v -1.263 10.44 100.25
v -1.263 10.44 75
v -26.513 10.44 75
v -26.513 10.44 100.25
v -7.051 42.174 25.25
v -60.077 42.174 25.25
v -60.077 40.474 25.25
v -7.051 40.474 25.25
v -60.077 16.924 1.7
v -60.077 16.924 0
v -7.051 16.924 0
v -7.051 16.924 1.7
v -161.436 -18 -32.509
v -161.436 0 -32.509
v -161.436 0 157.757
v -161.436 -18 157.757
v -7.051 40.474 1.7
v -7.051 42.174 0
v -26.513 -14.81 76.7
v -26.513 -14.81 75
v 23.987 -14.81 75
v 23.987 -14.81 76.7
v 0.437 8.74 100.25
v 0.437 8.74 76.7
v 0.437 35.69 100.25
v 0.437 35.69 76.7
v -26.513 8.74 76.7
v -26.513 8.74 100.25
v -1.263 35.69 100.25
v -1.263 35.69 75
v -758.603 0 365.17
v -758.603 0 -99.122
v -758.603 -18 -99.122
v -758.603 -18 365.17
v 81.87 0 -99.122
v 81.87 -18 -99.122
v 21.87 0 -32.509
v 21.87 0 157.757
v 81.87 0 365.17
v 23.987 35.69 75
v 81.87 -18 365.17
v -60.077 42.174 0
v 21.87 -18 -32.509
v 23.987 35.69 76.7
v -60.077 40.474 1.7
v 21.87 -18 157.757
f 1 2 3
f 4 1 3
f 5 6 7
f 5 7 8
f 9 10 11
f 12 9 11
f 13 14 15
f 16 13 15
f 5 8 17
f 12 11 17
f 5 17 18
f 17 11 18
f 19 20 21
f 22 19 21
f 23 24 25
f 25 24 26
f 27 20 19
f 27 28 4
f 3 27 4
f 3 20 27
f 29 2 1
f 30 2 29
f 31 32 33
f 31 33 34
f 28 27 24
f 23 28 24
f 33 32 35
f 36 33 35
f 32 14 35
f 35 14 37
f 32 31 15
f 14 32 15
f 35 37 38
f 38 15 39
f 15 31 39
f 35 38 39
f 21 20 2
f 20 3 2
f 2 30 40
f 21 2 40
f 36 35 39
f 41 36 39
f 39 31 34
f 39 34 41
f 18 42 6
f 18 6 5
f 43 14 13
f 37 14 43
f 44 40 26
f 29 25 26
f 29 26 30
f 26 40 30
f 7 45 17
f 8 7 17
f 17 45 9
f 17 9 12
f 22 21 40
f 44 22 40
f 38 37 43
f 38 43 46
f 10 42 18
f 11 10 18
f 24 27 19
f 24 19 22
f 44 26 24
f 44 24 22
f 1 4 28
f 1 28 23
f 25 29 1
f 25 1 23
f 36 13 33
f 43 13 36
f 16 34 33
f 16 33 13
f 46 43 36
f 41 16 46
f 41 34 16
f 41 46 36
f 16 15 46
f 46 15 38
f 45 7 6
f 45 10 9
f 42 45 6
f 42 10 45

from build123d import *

# Parameters (mm, degrees)
F2_W      = 53.0254556797
F2_H      = 23.55
F3_DEPTH  = 1.7
F2_H_2    = 1.7
F4_DEPTH  = 25.25
F5_W      = 840.4729366302
F5_H      = 464.2916843295
F5_W_2    = 183.3056384325
F5_H_2    = 190.2654580772
F6_DEPTH  = 18
F8_W      = 25.25
F8_H      = 1.7
F8_W_2    = 1.7
F8_H_2    = 25.25
F9_DEPTH  = 25.25
F8_H_3    = 23.55
F10_DEPTH = 1.7


with BuildPart() as f3:
    # F2 (on Top) → F3 (new body)
    with BuildSketch(Plane.XY):
        with Locations((-33.5639894474, 28.6992099345)):
            Rectangle(F2_W, F2_H)
    extrude(amount=F3_DEPTH)

    # F2 (on Top) → F4 (join)
    with BuildSketch(Plane.XY):
        with Locations((-33.5639894474, 41.3242099345)):
            Rectangle(F2_W, F2_H_2)
    extrude(amount=F4_DEPTH)


with BuildPart() as f6:
    # F5 (on Front) → F6 (new body)
    with BuildSketch(Plane.XZ):
        with Locations((-338.3664786816, 133.0243237317)):
            Rectangle(F5_W, F5_H)
        with Locations((-69.7828295827, 62.6240614802)):
            Rectangle(F5_W_2, F5_H_2, mode=Mode.SUBTRACT)
    extrude(amount=F6_DEPTH)


with BuildPart() as f9:
    # F8 (on offset) → F9 (new body)
    with BuildSketch(Plane.XY.offset(75)):
        with Locations((-13.8877278399, 9.59)):
            Rectangle(F8_W, F8_H)
        with Locations((-0.4127278399, 9.59)):
            Rectangle(F8_W_2, F8_H)
        with Locations((-0.4127278399, 23.065)):
            Rectangle(F8_W_2, F8_H_2)
    extrude(amount=F9_DEPTH)

    # F8 (on offset) → F10 (join)
    with BuildSketch(Plane.XY.offset(75)):
        with Locations((-13.8877278399, -3.035)):
            Rectangle(F8_W, F8_H_3)
        with Locations((-0.4127278399, -3.035)):
            Rectangle(F8_W_2, F8_H_3)
        Polygon((0.4372721601, 35.69), (0.4372721601, 10.44), (0.4372721601, 8.74), (0.4372721601, -14.81), (23.9872721601, -14.81), (23.9872721601, 35.69), align=None)
    extrude(amount=F10_DEPTH)


solid = Compound([f3.part, f6.part, f9.part])
